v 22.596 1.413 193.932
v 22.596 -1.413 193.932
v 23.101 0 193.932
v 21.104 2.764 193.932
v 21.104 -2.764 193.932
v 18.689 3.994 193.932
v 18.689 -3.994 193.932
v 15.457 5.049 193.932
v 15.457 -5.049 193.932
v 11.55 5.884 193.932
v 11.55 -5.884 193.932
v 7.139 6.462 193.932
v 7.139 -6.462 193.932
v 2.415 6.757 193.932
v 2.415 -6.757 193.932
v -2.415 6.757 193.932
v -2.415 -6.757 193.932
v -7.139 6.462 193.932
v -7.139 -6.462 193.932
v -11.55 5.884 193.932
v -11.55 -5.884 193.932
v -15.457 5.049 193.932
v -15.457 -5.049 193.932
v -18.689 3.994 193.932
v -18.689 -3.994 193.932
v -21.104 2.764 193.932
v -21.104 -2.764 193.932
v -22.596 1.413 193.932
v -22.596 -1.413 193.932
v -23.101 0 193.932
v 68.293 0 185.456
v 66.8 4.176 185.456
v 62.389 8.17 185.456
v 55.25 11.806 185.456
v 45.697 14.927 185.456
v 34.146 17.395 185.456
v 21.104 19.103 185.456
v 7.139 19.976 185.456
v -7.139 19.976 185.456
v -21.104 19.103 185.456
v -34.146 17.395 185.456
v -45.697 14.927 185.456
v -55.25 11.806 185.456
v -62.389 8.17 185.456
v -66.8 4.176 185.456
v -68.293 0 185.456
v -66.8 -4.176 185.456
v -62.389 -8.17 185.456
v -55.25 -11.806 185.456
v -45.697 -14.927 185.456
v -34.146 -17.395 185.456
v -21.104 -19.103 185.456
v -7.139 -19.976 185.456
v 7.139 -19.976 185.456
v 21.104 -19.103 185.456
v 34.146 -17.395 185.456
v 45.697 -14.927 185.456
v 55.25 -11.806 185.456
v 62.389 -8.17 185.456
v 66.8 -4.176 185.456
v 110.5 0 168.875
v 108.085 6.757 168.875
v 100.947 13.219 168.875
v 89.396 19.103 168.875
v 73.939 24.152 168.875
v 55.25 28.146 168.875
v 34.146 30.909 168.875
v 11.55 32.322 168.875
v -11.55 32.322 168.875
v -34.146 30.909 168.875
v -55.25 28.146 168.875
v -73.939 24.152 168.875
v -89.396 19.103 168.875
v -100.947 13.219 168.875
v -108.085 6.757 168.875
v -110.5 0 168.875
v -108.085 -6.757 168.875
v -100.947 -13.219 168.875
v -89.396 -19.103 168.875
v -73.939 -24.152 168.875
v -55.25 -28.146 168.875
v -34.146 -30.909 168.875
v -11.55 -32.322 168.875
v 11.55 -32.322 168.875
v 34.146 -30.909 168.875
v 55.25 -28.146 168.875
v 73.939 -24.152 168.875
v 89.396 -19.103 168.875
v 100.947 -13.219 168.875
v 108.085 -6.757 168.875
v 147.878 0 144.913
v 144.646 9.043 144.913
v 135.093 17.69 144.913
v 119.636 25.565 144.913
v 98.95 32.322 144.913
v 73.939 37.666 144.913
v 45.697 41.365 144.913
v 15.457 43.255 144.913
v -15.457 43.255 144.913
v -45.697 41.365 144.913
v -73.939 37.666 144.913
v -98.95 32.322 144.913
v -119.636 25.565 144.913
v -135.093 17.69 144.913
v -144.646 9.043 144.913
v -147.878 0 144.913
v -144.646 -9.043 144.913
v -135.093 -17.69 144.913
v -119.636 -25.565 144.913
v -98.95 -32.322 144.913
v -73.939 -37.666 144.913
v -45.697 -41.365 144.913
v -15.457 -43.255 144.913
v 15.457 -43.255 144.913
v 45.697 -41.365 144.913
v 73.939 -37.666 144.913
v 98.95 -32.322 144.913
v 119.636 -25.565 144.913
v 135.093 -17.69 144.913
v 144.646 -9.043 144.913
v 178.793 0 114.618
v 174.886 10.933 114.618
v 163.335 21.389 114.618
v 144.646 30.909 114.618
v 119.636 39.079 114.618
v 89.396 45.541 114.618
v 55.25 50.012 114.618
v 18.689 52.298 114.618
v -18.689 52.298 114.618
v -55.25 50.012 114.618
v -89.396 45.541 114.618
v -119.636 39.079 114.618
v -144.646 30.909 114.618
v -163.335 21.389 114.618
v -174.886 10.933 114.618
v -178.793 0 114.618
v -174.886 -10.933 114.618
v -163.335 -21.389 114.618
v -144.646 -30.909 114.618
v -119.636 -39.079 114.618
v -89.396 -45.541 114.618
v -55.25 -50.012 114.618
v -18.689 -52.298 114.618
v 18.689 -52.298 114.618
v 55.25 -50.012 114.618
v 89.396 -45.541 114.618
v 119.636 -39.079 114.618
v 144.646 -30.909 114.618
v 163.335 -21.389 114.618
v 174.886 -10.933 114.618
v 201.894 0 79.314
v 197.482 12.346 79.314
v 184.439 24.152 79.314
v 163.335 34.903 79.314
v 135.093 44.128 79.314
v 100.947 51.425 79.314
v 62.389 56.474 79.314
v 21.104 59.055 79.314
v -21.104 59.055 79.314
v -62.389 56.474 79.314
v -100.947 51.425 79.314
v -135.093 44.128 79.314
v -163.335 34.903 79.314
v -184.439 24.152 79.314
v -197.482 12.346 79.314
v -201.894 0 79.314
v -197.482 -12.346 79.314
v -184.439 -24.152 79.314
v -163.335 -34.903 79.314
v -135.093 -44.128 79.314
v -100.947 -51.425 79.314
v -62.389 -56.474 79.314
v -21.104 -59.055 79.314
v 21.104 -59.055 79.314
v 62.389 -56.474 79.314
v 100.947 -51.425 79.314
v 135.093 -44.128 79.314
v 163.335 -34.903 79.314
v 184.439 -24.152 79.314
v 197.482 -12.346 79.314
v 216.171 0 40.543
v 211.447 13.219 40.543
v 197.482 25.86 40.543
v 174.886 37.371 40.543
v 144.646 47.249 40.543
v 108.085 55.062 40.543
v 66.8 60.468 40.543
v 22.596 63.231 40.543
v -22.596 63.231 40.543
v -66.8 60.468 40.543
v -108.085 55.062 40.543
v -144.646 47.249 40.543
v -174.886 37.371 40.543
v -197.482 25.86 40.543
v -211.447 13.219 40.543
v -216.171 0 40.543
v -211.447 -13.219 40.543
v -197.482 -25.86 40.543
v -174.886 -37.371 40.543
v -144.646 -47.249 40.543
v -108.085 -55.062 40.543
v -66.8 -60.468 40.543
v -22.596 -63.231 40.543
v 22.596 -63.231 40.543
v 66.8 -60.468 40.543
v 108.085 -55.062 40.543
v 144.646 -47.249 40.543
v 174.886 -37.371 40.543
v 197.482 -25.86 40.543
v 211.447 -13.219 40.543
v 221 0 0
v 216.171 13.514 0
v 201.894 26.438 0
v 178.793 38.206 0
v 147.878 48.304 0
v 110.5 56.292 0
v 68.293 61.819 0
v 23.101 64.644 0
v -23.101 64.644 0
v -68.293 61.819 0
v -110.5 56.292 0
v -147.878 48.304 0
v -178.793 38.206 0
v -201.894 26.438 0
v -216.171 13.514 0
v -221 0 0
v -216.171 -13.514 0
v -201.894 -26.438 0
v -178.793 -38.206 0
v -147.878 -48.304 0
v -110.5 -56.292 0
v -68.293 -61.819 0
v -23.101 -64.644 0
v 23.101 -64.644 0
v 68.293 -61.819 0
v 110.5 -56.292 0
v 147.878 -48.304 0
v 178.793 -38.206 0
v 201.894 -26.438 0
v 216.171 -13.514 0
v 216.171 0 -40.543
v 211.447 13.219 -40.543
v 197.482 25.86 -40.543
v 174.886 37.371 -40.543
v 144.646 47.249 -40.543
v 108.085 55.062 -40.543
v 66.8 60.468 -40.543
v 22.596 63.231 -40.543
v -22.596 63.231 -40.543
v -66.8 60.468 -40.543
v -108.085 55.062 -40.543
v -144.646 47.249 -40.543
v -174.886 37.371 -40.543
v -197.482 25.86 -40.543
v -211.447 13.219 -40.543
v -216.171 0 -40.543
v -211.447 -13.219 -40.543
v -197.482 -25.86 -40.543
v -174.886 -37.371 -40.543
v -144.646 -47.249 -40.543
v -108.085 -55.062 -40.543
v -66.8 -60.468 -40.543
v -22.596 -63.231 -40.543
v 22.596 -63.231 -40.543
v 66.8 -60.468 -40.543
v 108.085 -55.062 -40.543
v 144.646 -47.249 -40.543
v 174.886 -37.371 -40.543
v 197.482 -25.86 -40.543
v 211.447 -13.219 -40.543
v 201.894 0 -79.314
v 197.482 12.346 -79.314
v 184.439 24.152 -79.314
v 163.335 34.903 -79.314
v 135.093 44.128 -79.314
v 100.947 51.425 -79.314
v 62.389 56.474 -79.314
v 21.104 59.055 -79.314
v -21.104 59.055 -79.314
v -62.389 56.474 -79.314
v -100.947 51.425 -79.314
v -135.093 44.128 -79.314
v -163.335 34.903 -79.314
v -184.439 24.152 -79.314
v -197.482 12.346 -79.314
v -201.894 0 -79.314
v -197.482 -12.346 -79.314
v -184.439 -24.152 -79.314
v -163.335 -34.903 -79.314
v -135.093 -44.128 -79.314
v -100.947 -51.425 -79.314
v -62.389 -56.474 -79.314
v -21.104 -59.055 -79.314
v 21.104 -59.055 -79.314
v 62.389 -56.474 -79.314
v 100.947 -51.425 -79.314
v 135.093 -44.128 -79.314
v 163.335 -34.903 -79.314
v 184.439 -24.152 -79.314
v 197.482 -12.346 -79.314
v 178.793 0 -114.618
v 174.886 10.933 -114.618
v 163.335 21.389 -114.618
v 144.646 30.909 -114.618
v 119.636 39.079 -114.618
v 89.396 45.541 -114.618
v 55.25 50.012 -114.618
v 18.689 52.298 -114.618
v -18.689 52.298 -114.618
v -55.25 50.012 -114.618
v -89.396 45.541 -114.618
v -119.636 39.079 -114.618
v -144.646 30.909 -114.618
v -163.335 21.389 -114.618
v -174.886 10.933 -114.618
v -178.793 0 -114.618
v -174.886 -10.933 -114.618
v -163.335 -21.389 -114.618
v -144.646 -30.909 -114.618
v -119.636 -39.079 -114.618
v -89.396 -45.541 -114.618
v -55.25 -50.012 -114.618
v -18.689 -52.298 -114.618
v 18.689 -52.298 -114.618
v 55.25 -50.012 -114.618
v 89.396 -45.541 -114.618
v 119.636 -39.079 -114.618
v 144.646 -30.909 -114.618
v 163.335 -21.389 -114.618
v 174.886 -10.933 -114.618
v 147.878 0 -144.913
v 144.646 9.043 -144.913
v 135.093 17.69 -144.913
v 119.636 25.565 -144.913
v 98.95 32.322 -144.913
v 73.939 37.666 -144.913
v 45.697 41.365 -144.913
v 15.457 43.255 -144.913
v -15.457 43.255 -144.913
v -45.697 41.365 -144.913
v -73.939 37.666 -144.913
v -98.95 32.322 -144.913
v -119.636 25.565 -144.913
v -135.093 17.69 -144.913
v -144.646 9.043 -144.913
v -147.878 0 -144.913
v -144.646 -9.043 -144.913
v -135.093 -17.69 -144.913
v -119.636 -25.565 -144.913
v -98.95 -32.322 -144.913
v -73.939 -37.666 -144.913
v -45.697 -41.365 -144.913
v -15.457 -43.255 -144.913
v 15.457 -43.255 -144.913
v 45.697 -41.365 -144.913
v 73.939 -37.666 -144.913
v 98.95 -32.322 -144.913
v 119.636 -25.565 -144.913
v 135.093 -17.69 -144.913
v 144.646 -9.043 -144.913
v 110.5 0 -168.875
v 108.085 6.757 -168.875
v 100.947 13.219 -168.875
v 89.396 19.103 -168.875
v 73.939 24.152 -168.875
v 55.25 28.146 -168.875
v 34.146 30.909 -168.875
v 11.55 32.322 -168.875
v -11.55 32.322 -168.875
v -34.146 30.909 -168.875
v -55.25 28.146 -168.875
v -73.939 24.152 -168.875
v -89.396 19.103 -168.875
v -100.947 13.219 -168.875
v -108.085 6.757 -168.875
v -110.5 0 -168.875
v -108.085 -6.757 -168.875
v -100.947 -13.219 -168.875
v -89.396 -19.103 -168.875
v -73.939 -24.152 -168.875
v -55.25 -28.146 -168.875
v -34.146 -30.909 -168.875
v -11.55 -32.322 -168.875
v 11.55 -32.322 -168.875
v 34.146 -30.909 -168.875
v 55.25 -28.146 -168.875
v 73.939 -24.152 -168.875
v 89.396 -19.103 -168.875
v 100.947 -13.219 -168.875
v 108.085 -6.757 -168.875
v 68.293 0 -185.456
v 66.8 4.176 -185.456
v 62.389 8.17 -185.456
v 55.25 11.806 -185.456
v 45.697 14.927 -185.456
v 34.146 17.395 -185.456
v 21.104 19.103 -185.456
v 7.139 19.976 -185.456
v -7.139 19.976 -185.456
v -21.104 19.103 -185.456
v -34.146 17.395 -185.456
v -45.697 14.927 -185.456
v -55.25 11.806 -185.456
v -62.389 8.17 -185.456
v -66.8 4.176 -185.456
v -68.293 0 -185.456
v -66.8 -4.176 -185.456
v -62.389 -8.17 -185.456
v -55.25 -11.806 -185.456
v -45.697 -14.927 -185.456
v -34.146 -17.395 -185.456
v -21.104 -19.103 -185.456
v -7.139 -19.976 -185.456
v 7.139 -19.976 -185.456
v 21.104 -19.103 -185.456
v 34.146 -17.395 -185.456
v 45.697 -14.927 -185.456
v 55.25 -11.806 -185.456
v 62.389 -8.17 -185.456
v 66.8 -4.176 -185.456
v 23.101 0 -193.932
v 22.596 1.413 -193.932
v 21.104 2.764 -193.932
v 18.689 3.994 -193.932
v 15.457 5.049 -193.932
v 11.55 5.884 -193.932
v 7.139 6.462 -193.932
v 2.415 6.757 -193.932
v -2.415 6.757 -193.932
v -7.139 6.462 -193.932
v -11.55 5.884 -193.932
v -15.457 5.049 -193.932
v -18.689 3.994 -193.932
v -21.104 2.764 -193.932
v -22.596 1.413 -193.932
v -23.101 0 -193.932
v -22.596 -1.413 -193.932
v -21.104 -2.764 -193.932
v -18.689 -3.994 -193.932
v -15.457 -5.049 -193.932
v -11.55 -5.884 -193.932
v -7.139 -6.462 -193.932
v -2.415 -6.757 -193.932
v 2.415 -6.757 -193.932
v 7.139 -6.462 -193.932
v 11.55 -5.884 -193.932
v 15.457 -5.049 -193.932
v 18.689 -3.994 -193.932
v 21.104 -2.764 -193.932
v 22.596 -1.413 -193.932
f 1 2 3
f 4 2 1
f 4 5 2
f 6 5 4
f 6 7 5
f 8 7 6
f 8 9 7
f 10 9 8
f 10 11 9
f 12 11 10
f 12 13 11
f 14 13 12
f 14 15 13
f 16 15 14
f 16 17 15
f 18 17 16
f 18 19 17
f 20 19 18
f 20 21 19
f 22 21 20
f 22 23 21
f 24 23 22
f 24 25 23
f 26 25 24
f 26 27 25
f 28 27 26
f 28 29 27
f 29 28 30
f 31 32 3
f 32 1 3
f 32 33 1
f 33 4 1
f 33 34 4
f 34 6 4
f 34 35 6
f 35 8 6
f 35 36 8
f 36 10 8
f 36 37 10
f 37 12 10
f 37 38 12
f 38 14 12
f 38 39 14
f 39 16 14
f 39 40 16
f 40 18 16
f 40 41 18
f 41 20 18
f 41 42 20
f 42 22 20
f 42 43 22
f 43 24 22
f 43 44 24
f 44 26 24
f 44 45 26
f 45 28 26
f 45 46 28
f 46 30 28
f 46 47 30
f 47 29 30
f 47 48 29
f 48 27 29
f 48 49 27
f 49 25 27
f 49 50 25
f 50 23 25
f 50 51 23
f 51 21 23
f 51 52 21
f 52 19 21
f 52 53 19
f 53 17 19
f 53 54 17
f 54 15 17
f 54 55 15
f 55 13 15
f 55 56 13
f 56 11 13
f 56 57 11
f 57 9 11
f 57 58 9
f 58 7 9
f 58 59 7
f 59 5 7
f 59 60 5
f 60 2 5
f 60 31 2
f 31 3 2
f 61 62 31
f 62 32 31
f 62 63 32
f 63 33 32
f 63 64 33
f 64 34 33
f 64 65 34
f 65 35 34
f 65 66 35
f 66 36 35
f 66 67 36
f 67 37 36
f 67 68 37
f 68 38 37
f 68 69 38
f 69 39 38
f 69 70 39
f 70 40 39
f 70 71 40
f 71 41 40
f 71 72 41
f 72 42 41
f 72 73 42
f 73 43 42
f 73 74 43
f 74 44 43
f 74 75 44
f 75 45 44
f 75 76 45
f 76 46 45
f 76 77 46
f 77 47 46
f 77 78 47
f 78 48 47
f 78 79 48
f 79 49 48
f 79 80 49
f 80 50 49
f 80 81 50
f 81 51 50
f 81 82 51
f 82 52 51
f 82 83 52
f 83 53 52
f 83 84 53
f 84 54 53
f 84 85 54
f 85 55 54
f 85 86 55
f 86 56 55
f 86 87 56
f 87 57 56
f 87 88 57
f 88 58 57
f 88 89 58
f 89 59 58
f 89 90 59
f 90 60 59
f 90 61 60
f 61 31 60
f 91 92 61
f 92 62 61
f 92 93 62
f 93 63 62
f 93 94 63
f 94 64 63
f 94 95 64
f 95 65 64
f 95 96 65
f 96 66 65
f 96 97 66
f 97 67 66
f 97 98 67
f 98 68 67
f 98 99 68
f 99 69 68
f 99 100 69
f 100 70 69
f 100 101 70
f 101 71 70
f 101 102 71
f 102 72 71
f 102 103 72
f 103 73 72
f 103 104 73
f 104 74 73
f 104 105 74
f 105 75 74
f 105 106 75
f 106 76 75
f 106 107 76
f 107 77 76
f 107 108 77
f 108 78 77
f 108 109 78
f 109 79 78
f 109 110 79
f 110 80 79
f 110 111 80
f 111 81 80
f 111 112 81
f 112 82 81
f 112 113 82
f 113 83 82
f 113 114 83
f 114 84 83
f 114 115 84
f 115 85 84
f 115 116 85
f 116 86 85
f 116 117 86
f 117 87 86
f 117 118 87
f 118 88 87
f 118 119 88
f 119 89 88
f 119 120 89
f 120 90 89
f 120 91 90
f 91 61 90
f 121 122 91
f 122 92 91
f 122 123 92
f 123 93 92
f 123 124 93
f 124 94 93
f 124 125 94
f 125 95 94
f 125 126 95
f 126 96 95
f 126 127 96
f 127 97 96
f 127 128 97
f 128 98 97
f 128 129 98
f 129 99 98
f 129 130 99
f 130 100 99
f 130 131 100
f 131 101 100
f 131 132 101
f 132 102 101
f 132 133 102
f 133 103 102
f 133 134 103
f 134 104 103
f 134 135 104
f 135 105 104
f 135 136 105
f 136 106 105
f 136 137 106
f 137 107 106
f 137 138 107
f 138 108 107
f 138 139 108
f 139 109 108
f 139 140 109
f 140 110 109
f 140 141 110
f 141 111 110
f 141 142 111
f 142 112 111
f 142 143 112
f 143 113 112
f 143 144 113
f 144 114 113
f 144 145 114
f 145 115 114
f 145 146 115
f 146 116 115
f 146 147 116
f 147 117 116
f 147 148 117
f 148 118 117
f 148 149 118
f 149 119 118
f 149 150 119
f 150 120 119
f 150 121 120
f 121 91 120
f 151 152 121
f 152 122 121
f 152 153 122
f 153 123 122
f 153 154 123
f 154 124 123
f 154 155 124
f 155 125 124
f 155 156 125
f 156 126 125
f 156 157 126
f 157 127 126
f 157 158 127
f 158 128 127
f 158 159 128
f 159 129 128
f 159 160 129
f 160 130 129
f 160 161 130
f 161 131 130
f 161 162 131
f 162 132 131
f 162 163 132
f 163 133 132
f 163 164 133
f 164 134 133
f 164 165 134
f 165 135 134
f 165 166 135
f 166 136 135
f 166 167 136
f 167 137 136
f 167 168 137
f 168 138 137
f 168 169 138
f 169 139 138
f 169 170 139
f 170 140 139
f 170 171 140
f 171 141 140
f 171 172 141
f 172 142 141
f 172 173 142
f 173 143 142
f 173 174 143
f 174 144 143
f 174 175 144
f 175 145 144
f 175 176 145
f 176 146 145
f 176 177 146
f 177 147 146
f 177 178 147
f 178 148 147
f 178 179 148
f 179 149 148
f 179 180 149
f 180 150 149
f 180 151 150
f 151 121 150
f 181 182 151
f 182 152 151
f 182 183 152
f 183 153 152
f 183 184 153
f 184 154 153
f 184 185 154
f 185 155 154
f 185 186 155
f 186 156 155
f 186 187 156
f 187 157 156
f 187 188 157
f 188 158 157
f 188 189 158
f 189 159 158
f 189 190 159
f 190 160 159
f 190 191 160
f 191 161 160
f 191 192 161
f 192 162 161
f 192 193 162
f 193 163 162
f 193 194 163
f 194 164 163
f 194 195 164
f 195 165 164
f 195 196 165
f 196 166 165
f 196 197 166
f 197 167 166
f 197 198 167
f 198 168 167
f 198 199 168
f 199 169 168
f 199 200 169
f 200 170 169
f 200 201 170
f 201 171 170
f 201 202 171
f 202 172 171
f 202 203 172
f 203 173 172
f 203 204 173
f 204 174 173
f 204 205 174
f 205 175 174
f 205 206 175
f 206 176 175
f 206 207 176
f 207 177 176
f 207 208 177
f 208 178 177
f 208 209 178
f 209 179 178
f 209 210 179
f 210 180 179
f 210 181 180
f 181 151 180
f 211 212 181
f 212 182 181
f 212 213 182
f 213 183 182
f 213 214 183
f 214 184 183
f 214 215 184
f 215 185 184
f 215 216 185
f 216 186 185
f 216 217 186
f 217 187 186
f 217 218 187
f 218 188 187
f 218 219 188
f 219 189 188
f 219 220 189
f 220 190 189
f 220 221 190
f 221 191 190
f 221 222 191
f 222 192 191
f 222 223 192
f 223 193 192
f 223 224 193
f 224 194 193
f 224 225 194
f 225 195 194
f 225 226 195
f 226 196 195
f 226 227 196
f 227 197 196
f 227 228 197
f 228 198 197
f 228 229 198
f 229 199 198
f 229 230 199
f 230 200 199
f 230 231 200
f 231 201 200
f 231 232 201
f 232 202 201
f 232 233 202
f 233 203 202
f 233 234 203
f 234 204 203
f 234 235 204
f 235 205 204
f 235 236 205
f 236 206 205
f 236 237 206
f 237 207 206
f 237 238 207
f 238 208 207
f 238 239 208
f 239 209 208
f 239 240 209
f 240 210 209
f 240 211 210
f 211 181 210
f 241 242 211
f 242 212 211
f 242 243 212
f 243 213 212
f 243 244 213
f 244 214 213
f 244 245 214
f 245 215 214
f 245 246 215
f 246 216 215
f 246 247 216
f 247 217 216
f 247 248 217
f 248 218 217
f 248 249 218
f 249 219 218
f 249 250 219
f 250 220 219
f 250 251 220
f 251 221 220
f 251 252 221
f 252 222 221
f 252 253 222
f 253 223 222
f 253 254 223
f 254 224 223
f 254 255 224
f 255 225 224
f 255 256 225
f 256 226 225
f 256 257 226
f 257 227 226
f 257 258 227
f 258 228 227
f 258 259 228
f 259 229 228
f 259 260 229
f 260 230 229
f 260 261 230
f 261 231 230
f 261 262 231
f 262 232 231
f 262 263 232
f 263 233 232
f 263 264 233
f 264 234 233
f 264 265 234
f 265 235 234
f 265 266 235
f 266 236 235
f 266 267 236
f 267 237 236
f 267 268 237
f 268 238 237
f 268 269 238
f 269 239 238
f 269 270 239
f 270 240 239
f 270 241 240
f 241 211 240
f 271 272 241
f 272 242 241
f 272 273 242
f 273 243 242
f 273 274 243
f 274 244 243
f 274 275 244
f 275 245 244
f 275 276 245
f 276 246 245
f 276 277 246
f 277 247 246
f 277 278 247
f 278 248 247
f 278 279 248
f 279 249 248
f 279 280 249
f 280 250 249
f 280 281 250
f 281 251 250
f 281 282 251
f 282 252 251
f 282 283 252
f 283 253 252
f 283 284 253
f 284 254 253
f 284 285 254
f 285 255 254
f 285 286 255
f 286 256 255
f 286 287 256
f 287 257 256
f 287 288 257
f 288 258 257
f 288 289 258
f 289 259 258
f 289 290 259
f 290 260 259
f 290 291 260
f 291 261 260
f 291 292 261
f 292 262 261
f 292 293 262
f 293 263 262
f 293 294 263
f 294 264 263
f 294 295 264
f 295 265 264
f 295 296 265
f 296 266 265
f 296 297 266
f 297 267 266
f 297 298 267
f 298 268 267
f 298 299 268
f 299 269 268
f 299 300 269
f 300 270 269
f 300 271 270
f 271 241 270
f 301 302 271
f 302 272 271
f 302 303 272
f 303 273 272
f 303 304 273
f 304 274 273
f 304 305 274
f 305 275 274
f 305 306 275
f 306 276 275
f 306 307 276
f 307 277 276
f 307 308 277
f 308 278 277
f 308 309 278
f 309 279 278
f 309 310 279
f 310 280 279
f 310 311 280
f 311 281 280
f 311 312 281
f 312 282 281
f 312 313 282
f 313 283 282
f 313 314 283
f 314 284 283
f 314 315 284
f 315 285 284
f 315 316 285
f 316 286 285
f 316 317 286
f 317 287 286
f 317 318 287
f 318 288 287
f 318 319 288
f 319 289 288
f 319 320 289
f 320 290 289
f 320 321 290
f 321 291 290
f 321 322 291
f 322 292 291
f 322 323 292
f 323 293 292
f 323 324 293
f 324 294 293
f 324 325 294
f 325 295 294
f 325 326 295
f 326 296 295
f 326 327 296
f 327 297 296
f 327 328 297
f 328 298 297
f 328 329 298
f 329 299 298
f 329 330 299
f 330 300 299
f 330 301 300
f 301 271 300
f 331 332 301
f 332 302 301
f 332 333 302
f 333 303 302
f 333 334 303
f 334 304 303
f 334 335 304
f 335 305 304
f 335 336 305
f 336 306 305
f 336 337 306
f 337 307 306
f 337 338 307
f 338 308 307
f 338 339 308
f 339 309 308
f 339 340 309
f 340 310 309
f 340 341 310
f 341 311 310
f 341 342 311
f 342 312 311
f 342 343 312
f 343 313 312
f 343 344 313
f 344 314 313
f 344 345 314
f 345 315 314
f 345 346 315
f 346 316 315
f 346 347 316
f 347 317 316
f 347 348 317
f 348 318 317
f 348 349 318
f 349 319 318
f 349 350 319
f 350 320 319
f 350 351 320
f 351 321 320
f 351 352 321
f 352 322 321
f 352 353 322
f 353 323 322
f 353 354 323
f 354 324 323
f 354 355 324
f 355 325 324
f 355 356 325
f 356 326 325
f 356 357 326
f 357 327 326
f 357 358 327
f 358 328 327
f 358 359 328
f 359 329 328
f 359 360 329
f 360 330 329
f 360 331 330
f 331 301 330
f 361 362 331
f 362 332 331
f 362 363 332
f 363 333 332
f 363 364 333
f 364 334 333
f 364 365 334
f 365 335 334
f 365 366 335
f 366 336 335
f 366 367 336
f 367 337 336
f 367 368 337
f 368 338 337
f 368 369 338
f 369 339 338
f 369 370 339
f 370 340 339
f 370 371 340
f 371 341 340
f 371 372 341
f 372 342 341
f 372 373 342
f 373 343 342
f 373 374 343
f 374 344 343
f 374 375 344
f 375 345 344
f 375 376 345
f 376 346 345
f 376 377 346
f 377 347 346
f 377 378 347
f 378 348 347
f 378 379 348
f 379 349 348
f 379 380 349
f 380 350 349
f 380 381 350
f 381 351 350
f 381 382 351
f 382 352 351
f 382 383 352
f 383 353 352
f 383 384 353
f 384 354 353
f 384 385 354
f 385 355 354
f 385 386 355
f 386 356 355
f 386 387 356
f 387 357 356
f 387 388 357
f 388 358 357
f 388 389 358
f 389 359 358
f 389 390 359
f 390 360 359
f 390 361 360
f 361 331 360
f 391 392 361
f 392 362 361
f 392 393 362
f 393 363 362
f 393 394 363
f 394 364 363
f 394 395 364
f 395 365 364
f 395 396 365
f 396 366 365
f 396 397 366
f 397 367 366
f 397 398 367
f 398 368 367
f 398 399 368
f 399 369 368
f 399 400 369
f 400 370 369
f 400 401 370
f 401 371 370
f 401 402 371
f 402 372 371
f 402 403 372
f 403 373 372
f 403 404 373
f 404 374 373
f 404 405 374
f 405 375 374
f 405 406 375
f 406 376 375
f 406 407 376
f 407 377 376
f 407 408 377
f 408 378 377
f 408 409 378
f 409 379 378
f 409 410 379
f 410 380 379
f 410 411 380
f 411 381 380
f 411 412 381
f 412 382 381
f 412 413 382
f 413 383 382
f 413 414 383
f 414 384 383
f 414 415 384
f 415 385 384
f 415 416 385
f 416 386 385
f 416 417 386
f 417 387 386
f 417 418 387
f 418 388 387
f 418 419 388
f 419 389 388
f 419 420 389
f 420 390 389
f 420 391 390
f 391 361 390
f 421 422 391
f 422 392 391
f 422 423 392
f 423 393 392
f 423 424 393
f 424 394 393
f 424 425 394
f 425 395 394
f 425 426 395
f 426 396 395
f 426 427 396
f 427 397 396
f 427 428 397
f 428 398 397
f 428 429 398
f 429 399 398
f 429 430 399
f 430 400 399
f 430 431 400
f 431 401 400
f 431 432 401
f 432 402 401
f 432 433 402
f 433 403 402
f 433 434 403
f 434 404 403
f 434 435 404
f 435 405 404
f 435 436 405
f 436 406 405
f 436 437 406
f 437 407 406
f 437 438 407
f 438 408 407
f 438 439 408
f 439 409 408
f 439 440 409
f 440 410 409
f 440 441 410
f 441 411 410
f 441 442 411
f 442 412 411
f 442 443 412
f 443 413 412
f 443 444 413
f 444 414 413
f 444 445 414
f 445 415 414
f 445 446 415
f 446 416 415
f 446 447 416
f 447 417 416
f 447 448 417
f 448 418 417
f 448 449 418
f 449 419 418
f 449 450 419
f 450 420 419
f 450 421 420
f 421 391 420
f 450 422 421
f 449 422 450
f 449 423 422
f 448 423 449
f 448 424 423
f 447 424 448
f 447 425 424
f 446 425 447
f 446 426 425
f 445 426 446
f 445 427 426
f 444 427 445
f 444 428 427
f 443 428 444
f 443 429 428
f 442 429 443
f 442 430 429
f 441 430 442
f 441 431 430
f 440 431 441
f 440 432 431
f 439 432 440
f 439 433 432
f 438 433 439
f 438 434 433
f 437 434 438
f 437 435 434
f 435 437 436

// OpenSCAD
// Generated by SolidPython 1.0.1 on 2020-07-29 00:46:52


scale(v = [17, 5, 15]) {
	sphere(r = 13);
}
/***********************************************
*********      SolidPython code:      **********
************************************************
 
# import packages: SolidPython
from solid import *
from solid.utils import *
from itertools import chain, combinations, permutations


class Resize:

    def __init__(self, scad_file):
        self.scad_file = scad_file
        #self.scad_file = import_scad(scad_file)
        # cone/cylinder param:
        self.r1 = 0
        self.r2 = 0
        self.h = 0
        # rectangular prism param:
        self.w = 0
        self.l = 0
        # ellipse param:
        self.r = 0

    # import OpenScad code (file name corresponds to shape)


    # classify shape + parameters
    def assign(self, param1, param2, param3):
        if self.scad_file == 'cone.scad':
            self.r1 = param1
            self.r2 = param2
            self.h = param3
        elif self.scad_file == 'cylinder.scad':
            self.r1 = param1
            self.r2 = param2
            self.h = param3
        elif self.scad_file == 'rectangularPrism.scad':
            self.h = param1
            self.l = param2
            self.w = param3
        else:
            self.r = param1
            self.h = param2

    # resize parameters
    def iterate(self):
        x = range(3, 20, 2)
        i = 1
        if self.scad_file == 'cone.scad':
            tempList = list(permutations(x, 2))
            for temp in tempList:
                param1 = temp[0]
                param2 = temp[1]
                filepath = 'produced_scad_files/' + 'cone' + str(param1) + '_' + str(param2) + '_' + '.scad'
                scad_render_to_file(cylinder(h=param1, r1=param2, r2=0), filepath)

        elif self.scad_file == 'cylinder.scad':
            tempList = list(permutations(x, 3))
            for temp in tempList:
                param1 = temp[0]
                param2 = temp[1]
                filepath = 'produced_scad_files/' + 'cylinder' + str(param1) + '_' + str(param2) + '_' + '.scad'
                scad_render_to_file(cylinder(h=param1, r1=param2, r2=param2), filepath)

        elif self.scad_file == 'rectangularPrism.scad':
            tempList = list(permutations(x, 3))
            for temp in tempList:
                param1 = temp[0]
                param2 = temp[1]
                param3 = temp[2]
                filepath = 'produced_scad_files/' + 'rectangularPrism' + str(param1) + '_' + str(param2) + '_' + str(
                    param3) + '.scad'
                scad_render_to_file(cube(size=(param1, param2, param3)), filepath)

        elif self.scad_file == 'ellipse.scad':
            tempList = list(permutations(x, 4))
            for temp in tempList:
                param1 = temp[0]
                param2 = temp[1]
                param3 = temp[2]
                param4 = temp[3]
                filepath = 'produced_scad_files/' + 'ellipse' + str(param1) + '_' + str(param2) + '_' + str(param3) + '_' + str(param4) + '.scad'
                scad_render_to_file(scale([param1, param2, param3])(sphere(r=param4)), filepath)

    def render_to_scadfile(self):
        scad_render_to_file(scad, 'example.scad') 
 
************************************************/
